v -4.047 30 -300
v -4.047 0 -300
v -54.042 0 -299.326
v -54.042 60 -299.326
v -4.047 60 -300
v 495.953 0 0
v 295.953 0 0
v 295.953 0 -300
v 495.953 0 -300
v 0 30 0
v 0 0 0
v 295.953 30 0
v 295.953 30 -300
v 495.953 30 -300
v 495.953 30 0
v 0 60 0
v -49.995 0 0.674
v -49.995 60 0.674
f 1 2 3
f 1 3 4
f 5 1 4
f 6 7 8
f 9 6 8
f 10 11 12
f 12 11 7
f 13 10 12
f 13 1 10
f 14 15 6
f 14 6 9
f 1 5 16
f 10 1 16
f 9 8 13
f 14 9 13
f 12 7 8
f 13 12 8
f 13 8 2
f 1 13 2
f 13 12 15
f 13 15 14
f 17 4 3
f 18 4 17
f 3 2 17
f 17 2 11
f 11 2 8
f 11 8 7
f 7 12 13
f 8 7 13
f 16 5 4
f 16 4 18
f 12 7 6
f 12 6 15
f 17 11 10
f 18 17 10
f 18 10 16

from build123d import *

# Parameters (mm, degrees)
EXTRUDE_1_DEPTH = 30
SKETCH_2_W      = 300
SKETCH_2_H      = 30
EXTRUDE_2_DEPTH = 200
SKETCH_3_W      = 300.027292571
SKETCH_3_H      = 60
EXTRUDE_3_DEPTH = 50


with BuildPart() as part:
    # 草图1 → 凸台-拉伸1 (new body)
    with BuildSketch(Plane(origin=(0, 0, 0), x_dir=(1, 0, 0), z_dir=(0, 1, 0))):
        Polygon((0, 0), (295.95323741, 0), (295.95323741, 300), (-4.04676259, 300), align=None)
    extrude(amount=EXTRUDE_1_DEPTH)

    # 草图3 → 凸台-拉伸3 (add)
    with BuildSketch(Plane(origin=(0, 0, 0), x_dir=(0.013487981560780847, 0, 0.9999090330392142), z_dir=(-0.9999090330392142, 0, 0.013487981560780847))):
        with Locations((-150.013646286, 30)):
            Rectangle(SKETCH_3_W, SKETCH_3_H)
    extrude(amount=EXTRUDE_3_DEPTH)


with BuildPart() as body_2:
    # 草图2 → 凸台-拉伸2 (new body)
    with BuildSketch(Plane(origin=(295.95323741, 0, 0), x_dir=(0, 0, -1), z_dir=(1, 0, 0))):
        with Locations((150, 15)):
            Rectangle(SKETCH_2_W, SKETCH_2_H)
    extrude(amount=EXTRUDE_2_DEPTH)


solid = Compound([part.part, body_2.part])
